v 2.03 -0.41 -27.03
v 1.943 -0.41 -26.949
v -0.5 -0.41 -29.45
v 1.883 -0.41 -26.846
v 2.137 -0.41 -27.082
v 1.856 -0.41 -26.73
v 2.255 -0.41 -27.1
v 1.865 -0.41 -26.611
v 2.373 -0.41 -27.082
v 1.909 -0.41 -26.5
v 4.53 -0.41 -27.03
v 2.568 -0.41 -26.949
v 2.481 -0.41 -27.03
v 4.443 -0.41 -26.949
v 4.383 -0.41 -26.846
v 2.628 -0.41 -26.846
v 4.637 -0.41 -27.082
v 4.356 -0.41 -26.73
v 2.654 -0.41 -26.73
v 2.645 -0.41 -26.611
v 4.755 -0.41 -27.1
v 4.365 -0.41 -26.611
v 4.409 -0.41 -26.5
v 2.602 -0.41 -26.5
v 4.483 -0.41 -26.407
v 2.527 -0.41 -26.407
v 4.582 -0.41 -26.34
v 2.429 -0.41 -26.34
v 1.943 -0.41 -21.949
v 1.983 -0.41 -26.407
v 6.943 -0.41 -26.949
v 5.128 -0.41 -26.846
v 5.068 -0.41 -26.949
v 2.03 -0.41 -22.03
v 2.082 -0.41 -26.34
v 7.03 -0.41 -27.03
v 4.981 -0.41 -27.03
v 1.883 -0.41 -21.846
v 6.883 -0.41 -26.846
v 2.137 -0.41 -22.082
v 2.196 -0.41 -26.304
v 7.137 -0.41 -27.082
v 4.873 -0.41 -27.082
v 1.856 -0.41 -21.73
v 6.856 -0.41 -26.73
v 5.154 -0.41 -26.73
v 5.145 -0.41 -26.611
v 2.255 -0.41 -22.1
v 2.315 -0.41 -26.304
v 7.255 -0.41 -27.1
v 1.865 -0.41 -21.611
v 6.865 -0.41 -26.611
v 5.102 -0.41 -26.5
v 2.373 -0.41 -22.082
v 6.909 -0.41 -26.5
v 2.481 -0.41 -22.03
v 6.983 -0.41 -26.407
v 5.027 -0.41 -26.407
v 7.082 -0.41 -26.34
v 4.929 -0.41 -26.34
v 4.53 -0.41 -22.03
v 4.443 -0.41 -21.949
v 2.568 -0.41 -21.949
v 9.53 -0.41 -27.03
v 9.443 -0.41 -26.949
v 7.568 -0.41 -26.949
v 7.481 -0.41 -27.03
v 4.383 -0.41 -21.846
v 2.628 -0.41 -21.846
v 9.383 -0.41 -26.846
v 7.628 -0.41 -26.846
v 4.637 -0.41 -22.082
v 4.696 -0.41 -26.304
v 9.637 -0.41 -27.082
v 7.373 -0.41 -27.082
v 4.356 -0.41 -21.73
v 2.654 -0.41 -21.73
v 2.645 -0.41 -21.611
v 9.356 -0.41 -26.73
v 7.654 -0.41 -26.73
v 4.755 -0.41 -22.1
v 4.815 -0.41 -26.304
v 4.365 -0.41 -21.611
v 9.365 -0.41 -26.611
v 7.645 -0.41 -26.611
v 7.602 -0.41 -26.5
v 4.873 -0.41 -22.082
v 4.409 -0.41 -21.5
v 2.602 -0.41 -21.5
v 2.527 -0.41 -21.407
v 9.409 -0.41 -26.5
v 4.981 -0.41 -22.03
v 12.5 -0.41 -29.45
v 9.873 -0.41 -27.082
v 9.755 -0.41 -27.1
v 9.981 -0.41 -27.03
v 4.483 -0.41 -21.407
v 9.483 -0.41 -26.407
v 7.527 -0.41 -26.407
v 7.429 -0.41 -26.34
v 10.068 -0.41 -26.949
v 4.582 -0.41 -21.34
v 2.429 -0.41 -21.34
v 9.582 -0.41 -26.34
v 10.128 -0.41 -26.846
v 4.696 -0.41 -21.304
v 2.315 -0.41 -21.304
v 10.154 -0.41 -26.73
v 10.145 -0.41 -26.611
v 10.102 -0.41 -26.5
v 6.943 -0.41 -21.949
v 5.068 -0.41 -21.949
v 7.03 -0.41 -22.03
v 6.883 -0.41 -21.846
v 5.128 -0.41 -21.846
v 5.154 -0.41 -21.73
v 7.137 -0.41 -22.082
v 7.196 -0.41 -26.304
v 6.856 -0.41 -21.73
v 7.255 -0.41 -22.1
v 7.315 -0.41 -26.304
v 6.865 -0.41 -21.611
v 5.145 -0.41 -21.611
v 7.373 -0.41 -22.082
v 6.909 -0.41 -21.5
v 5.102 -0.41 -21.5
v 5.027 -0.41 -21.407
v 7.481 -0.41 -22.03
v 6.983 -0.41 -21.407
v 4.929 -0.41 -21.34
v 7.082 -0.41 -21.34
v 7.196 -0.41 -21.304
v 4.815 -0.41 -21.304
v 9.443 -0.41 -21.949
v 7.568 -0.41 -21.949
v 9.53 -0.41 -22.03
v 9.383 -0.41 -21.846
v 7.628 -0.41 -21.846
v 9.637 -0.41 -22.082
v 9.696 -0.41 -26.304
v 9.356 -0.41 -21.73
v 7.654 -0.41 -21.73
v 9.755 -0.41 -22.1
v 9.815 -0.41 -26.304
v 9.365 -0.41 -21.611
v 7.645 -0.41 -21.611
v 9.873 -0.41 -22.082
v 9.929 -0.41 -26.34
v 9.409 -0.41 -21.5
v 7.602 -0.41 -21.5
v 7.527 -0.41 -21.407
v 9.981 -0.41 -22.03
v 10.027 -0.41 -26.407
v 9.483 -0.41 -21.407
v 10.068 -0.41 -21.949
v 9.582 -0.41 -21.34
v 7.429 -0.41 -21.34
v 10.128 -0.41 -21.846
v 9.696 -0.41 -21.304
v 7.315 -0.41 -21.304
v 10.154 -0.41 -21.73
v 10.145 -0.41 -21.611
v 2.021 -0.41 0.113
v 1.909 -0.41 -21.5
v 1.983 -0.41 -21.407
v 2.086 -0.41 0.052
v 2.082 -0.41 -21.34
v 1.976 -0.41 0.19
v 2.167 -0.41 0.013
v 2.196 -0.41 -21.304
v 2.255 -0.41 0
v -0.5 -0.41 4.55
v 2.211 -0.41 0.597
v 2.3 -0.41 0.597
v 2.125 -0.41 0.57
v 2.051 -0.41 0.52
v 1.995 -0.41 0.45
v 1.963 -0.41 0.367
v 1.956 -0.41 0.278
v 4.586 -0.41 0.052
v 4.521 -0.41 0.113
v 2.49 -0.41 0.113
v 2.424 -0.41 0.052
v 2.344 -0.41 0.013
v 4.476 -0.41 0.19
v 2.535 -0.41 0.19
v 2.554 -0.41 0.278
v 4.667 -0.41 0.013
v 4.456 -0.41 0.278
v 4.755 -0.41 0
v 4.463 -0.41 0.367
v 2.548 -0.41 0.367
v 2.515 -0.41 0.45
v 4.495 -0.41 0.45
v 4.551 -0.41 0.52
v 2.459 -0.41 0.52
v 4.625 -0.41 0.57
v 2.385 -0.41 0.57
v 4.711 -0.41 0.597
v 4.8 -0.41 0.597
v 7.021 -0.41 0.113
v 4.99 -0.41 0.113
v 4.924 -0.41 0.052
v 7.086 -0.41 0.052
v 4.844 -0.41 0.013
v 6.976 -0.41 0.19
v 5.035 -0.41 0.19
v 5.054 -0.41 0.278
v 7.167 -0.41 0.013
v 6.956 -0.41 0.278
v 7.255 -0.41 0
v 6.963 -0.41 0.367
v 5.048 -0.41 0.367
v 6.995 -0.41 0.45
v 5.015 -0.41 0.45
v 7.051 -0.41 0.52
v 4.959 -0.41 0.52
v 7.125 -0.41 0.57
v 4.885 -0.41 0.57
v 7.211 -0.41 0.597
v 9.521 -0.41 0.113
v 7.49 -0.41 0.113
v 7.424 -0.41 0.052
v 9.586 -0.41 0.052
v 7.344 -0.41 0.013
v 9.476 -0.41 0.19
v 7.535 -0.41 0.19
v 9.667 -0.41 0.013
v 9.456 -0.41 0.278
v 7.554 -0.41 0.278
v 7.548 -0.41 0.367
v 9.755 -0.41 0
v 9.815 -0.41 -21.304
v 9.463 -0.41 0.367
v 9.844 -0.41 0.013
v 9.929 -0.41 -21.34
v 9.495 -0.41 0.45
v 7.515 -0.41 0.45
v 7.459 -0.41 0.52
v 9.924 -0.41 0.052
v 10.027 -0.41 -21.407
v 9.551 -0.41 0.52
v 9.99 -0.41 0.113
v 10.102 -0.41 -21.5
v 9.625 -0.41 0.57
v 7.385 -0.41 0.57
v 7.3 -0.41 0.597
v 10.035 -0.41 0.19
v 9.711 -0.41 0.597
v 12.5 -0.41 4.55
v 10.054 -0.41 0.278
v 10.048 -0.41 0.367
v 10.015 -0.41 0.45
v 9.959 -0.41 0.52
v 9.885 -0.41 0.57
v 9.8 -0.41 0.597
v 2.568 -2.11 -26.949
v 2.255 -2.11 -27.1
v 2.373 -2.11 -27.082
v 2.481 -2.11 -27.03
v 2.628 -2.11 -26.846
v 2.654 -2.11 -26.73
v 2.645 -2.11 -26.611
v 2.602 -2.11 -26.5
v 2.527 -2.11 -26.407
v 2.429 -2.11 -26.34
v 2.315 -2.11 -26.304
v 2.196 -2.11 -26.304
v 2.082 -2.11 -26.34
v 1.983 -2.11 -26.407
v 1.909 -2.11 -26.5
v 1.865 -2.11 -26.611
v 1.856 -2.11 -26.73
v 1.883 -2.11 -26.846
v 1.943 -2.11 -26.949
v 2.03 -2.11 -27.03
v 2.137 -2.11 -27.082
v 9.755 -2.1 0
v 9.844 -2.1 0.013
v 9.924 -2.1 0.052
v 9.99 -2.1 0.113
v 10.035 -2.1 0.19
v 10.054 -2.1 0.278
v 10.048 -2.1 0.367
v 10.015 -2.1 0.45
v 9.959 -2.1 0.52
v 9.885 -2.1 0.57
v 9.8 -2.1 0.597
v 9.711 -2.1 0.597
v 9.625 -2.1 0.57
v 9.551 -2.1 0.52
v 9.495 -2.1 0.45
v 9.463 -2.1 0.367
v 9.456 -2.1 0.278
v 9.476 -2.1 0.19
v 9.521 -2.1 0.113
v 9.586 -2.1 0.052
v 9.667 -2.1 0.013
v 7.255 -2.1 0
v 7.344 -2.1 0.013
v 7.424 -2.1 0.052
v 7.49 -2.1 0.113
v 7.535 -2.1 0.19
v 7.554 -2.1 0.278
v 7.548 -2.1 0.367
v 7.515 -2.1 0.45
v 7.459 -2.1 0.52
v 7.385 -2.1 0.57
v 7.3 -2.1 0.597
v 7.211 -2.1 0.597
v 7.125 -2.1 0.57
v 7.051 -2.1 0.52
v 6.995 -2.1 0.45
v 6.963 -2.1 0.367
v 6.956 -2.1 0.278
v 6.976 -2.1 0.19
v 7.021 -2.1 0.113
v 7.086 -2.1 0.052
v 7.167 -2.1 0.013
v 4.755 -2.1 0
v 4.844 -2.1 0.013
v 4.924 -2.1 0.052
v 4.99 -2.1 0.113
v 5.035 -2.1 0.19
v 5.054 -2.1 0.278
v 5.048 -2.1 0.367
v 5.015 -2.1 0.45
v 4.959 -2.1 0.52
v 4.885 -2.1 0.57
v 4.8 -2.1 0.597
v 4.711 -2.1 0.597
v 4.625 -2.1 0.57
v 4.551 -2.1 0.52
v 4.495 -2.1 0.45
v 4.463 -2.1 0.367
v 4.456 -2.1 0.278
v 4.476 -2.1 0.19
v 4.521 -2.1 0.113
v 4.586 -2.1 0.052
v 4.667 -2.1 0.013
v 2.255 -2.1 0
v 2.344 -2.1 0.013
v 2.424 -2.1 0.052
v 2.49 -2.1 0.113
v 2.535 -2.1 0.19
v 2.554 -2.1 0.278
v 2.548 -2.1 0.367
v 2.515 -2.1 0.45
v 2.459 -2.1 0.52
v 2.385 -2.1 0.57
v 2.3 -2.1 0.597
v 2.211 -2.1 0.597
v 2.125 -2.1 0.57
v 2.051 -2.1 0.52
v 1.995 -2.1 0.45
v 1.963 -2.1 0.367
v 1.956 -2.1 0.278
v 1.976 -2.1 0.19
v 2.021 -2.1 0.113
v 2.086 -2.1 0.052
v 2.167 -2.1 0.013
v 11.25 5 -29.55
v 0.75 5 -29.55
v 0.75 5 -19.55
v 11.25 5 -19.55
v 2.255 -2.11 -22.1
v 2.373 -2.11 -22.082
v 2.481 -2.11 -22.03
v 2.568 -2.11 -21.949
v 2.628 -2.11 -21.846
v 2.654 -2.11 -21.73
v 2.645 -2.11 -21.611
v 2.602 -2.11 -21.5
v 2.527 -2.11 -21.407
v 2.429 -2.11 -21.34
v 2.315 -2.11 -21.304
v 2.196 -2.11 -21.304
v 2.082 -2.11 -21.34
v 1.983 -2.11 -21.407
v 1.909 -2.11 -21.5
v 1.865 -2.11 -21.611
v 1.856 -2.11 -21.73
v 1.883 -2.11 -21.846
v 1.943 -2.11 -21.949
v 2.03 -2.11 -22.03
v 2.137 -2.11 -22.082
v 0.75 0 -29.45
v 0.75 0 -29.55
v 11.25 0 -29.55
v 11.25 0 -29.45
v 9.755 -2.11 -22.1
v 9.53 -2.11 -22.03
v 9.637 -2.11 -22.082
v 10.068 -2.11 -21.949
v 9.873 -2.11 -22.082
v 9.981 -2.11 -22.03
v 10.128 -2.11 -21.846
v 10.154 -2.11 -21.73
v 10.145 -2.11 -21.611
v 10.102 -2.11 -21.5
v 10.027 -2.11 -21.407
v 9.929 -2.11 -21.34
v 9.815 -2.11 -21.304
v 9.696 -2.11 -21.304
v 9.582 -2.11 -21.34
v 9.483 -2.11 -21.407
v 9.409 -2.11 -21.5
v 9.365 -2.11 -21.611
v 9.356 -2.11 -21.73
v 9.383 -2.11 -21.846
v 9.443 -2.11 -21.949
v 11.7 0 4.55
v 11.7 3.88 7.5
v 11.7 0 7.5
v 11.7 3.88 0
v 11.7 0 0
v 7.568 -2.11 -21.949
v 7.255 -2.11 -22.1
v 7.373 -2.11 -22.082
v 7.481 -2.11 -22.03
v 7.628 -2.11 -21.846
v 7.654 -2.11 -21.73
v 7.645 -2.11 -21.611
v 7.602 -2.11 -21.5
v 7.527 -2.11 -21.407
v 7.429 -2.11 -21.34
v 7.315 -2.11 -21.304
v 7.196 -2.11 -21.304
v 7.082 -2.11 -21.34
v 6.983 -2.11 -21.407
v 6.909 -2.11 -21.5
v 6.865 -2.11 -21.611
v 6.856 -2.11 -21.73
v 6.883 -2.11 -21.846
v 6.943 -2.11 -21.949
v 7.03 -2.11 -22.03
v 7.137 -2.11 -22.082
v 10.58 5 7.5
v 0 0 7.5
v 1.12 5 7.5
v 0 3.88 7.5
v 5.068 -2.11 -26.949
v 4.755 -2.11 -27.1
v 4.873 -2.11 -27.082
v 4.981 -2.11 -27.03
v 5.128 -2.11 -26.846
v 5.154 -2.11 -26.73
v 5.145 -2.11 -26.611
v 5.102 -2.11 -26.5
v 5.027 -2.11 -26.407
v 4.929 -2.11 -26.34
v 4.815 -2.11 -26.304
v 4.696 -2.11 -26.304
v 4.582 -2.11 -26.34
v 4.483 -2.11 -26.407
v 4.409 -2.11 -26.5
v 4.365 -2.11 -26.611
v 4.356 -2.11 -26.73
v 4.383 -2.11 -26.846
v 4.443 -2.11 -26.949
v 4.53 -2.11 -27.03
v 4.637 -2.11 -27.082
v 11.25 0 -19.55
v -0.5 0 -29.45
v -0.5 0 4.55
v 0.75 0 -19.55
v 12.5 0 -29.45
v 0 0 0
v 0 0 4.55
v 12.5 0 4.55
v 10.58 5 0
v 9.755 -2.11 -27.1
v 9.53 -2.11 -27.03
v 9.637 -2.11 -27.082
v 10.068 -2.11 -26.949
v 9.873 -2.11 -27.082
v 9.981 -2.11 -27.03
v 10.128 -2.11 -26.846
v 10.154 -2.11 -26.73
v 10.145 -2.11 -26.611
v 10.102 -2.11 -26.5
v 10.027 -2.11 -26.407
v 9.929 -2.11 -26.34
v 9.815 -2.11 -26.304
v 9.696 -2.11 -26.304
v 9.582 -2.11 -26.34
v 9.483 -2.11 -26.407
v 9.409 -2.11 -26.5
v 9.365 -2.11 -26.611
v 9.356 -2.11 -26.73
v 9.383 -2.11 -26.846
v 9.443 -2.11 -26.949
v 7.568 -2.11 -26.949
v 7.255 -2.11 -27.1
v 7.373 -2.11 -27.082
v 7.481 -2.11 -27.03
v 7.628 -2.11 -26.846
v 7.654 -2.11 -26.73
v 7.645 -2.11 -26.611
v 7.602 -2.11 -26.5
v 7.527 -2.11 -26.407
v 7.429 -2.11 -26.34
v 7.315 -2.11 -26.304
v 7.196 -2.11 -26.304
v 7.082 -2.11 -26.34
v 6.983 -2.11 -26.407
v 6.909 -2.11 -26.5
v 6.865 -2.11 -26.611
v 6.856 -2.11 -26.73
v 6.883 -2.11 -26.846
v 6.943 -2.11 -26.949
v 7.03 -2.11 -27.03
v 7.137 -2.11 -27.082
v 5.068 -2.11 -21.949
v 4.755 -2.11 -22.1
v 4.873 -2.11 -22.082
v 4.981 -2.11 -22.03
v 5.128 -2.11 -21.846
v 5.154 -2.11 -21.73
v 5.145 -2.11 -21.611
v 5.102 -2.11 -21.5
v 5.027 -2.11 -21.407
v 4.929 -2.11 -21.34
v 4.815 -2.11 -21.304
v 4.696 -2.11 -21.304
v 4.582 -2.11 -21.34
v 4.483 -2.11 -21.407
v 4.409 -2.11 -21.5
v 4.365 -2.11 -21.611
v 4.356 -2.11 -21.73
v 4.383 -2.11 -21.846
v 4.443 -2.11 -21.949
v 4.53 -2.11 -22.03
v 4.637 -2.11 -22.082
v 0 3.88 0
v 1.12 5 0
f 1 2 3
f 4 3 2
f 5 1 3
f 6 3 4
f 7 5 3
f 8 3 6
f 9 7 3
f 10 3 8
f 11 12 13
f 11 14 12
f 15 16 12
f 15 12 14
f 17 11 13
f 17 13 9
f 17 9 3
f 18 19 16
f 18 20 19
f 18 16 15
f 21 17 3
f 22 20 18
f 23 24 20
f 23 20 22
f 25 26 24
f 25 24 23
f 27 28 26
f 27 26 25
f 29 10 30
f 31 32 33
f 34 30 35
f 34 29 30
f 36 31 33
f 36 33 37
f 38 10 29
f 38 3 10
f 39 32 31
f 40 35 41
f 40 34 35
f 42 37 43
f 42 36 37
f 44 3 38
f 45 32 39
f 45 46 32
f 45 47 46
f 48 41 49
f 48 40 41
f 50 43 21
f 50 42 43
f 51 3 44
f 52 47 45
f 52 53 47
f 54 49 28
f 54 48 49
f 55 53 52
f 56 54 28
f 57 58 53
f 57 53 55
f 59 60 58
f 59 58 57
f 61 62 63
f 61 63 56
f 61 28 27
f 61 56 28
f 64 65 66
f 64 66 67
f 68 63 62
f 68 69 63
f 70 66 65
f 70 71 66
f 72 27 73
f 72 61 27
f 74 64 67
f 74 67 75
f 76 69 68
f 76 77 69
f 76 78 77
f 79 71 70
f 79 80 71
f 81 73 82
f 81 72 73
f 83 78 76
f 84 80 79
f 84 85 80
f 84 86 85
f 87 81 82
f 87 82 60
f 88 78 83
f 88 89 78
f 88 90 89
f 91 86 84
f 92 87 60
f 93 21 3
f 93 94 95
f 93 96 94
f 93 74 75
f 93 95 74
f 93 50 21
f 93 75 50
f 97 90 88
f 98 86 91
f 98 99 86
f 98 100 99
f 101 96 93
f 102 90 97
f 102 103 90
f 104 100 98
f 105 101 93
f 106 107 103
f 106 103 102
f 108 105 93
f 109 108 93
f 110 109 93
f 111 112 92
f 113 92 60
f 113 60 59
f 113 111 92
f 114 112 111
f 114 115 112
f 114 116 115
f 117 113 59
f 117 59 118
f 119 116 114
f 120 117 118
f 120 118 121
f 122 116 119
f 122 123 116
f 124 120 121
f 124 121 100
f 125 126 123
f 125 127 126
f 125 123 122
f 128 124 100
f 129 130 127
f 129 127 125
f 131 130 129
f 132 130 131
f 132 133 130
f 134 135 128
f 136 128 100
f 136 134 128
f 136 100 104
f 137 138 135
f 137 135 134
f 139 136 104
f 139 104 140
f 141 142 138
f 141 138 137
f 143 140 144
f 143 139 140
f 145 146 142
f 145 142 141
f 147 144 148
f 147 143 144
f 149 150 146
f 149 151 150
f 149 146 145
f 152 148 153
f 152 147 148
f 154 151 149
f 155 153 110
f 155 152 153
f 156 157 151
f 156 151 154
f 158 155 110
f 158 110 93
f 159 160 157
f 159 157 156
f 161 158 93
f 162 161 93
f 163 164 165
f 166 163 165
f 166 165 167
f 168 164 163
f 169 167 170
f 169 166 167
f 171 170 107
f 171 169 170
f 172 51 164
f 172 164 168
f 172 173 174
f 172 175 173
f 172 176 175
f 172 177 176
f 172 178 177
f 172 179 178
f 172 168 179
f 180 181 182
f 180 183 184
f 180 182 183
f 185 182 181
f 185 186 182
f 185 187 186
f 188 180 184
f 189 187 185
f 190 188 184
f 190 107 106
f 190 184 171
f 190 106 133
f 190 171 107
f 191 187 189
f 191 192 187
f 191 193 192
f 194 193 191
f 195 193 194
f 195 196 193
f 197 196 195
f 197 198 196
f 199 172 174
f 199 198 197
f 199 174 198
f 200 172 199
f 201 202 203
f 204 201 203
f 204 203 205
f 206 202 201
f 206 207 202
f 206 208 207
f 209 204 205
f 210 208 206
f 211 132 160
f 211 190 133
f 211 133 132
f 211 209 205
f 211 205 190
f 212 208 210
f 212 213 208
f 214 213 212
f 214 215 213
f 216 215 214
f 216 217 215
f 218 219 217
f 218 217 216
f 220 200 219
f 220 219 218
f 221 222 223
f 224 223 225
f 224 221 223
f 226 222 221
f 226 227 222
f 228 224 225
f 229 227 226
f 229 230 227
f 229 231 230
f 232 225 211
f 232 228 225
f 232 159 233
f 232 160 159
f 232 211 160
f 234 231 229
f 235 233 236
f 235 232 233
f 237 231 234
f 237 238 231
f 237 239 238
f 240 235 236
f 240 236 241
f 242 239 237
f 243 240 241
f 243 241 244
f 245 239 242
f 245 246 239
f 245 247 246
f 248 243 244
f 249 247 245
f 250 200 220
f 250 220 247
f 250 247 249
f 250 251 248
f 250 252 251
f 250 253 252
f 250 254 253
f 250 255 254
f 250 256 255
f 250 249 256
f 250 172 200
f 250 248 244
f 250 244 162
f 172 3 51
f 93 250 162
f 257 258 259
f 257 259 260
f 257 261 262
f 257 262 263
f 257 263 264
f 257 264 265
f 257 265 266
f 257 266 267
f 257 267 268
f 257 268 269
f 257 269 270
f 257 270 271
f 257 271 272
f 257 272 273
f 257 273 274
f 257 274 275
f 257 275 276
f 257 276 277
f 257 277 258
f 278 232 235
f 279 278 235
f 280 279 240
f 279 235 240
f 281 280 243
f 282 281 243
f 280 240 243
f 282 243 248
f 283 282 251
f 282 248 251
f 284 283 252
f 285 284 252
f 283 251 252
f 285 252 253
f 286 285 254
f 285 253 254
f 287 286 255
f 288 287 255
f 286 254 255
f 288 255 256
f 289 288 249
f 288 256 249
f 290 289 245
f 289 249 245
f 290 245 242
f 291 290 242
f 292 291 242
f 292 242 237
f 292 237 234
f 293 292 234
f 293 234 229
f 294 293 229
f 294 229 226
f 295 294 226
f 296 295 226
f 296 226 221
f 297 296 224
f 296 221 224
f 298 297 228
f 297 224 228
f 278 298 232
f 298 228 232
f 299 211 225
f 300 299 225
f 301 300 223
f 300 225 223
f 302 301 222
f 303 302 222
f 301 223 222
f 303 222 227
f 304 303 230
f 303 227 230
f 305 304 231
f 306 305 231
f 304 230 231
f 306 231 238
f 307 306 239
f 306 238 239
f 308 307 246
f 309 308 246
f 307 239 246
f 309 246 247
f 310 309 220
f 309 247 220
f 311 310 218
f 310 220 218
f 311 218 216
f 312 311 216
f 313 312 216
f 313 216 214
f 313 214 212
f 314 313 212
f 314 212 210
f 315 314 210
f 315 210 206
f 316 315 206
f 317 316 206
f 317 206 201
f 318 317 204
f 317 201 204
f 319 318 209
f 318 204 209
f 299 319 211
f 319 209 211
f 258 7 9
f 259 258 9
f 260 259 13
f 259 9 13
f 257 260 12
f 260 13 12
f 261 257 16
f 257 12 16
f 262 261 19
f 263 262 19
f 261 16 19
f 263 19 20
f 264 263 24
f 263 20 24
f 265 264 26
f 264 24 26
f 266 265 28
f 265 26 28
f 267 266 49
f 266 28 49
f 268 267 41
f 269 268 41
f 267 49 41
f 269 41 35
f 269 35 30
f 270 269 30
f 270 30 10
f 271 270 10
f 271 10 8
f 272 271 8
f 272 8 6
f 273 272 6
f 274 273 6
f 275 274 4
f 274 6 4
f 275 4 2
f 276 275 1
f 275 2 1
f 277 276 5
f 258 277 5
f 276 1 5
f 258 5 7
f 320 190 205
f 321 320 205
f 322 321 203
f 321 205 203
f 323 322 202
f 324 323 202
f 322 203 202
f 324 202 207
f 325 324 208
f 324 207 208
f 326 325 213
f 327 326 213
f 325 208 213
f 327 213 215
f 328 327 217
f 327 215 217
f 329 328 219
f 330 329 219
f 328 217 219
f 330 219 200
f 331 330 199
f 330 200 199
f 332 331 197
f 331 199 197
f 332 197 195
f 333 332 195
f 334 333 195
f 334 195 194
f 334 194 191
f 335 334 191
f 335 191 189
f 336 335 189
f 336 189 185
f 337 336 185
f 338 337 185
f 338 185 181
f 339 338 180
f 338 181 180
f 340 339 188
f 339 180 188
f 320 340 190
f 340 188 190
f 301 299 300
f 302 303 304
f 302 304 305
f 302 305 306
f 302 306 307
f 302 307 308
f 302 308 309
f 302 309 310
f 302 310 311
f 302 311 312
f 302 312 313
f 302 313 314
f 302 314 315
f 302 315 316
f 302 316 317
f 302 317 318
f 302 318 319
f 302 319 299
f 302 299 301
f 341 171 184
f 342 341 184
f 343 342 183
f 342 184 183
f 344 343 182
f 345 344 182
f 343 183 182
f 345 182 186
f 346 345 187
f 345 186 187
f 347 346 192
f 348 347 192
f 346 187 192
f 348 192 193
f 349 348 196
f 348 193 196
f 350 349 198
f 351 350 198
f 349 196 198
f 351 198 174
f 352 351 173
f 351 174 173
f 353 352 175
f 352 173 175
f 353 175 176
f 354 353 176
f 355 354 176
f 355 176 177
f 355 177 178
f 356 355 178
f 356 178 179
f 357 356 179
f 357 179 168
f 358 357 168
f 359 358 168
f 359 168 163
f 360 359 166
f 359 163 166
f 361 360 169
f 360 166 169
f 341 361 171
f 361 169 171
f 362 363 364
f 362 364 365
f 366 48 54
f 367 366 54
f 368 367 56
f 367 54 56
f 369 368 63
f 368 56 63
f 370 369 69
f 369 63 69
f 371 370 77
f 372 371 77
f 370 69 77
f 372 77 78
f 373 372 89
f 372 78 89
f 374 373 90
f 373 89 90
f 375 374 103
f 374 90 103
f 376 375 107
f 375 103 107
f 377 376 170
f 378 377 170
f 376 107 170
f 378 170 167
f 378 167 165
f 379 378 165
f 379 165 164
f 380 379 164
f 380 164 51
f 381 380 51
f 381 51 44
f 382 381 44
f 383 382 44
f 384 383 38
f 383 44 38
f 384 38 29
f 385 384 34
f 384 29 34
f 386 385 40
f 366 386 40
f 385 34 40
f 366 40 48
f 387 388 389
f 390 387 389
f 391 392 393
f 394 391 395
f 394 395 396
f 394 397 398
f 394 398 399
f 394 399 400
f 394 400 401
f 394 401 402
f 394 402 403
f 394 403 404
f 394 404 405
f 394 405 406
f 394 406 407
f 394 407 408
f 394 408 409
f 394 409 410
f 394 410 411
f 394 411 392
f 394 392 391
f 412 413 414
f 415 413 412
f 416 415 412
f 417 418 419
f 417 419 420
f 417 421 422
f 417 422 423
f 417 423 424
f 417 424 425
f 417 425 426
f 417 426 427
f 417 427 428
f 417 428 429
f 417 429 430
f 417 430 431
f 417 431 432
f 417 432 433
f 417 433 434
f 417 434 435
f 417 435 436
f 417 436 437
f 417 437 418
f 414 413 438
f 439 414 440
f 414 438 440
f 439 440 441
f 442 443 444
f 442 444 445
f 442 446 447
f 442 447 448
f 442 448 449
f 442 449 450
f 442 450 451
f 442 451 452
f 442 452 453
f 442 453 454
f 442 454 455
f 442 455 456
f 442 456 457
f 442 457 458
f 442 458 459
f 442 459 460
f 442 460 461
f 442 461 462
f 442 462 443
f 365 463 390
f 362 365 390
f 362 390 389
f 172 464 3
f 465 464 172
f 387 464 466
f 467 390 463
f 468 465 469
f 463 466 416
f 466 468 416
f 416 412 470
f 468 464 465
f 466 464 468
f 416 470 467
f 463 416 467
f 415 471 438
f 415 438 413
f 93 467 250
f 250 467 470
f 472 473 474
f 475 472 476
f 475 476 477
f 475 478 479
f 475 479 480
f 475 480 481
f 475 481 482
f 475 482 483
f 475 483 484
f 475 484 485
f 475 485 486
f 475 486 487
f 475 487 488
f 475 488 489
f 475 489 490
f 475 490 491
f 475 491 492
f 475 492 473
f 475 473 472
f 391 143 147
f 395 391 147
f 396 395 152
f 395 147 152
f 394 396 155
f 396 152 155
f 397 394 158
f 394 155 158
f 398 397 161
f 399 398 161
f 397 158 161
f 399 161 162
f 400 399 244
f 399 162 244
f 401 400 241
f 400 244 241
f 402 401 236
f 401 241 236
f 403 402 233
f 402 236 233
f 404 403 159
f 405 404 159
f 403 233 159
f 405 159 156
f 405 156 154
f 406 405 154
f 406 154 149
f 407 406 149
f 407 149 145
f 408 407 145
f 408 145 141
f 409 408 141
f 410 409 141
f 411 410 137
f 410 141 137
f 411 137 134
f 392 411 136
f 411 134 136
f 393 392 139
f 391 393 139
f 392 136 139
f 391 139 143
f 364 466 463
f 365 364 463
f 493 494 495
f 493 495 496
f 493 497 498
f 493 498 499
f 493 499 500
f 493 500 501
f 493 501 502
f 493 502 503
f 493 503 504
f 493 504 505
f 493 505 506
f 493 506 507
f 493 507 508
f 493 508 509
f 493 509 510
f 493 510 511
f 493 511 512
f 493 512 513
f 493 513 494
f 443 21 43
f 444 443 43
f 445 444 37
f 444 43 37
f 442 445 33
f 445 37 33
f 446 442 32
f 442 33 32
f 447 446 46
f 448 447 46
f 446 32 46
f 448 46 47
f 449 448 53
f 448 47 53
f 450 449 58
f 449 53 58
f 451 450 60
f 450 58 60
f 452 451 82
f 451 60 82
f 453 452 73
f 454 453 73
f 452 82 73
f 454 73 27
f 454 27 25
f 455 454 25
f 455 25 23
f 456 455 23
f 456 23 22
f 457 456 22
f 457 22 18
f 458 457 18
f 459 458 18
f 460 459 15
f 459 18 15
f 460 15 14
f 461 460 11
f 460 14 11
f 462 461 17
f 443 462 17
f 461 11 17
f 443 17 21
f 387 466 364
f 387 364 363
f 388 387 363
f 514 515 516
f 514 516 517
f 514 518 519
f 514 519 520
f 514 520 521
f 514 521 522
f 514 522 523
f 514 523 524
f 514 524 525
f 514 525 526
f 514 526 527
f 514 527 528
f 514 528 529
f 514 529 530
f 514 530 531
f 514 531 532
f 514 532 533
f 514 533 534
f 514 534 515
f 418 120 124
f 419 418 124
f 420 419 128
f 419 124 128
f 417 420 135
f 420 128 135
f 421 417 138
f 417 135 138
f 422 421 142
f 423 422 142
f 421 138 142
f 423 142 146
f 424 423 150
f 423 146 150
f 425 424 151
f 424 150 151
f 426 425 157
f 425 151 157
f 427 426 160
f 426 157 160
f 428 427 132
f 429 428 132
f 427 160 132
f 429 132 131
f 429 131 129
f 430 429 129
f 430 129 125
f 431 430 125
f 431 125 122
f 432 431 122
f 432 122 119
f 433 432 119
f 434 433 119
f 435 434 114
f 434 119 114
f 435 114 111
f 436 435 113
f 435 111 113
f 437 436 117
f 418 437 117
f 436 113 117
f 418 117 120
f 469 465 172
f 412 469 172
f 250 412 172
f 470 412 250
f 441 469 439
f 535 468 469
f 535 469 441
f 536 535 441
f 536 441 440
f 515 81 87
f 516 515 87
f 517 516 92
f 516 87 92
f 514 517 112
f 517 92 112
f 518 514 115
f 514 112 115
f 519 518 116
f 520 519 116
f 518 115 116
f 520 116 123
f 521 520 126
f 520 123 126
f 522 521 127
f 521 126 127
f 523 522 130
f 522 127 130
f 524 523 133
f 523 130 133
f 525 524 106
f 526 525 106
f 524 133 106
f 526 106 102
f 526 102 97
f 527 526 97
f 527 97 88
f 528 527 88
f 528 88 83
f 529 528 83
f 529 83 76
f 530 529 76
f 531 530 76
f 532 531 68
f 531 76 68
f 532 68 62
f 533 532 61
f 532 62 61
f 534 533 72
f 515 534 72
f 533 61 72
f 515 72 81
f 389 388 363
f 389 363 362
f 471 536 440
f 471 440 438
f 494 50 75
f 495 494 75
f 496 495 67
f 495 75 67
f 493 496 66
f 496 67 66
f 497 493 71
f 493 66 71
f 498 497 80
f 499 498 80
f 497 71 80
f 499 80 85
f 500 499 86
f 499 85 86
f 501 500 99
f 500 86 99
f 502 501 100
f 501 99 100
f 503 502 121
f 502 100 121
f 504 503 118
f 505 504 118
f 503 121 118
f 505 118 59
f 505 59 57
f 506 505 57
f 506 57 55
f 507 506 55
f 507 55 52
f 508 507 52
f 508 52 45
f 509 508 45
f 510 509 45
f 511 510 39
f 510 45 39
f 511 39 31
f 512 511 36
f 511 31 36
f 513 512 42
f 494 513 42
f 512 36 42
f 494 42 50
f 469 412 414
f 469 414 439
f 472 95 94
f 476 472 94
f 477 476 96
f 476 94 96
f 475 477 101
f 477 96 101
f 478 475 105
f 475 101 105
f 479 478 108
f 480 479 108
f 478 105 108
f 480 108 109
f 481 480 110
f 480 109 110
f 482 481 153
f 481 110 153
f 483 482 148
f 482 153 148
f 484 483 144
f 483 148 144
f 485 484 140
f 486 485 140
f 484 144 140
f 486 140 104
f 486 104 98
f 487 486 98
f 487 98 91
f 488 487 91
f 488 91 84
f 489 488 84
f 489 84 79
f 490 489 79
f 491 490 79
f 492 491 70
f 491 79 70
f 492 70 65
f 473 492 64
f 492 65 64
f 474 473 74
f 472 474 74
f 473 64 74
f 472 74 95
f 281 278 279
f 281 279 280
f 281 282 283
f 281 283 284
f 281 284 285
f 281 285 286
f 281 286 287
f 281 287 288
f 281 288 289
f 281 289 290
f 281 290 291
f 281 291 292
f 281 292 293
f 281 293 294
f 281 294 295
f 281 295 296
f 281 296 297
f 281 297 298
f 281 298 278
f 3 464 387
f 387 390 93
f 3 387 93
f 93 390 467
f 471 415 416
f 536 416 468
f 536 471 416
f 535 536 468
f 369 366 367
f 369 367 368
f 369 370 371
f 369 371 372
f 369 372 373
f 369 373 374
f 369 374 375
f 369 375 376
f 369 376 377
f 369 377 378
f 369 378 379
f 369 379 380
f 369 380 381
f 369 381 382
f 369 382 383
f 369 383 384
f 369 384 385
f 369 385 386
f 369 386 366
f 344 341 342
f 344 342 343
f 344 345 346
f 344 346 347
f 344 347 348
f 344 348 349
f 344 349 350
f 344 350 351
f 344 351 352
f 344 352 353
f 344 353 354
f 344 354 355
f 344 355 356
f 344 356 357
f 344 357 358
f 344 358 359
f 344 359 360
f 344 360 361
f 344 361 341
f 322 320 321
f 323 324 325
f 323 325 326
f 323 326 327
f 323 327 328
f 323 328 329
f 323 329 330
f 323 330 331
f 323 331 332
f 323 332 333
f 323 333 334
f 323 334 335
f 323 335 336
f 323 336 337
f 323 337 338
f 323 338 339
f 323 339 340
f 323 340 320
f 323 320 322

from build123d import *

# Parameters (mm, degrees)
DODANIE_WYCI_GNI_CIE1_DEPTH = 7.5
SZKIC2_W                    = 13
SZKIC2_H                    = 34
DODANIE_WYCI_GNI_CIE2_DEPTH = 0.41
SZKIC3_R                    = 0.3
DODANIE_WYCI_GNI_CIE3_DEPTH = 1.69
SZKIC4_W                    = 10.5
SZKIC4_H                    = 10
DODANIE_WYCI_GNI_CIE4_DEPTH = 5
SZKIC6_R                    = 0.4
DODANIE_WYCI_GNI_CIE5_DEPTH = 1.7


with BuildPart() as part:
    # Szkic1 → Dodanie-wyciągnięcie1 (new body)
    with BuildSketch(Plane.XY):
        Polygon((10.58, 5), (11.7, 3.88), (11.7, 0), (0, 0), (0, 3.88), (1.12, 5), align=None)
    extrude(amount=DODANIE_WYCI_GNI_CIE1_DEPTH)

    # Szkic2 → Dodanie-wyciągnięcie2 (add)
    with BuildSketch(Plane.XZ):
        with Locations((6, -12.45)):
            Rectangle(SZKIC2_W, SZKIC2_H)
    extrude(amount=DODANIE_WYCI_GNI_CIE2_DEPTH)

    # Szkic3 → Dodanie-wyciągnięcie3 (add)
    with BuildSketch(Plane.XZ.offset(0.41)):
        with Locations(Location((2.255290514, 0.3, 0), (0, 0, 270))):
            Circle(SZKIC3_R)
        with Locations(Location((4.755290514, 0.3, 0), (0, 0, 270))):
            Circle(SZKIC3_R)
        with Locations(Location((7.255290514, 0.3, 0), (0, 0, 270))):
            Circle(SZKIC3_R)
        with Locations(Location((9.755290514, 0.3, 0), (0, 0, 270))):
            Circle(SZKIC3_R)
    extrude(amount=DODANIE_WYCI_GNI_CIE3_DEPTH)

    # Szkic4 → Dodanie-wyciągnięcie4 (add)
    with BuildSketch(Plane(origin=(0, 0, 0), x_dir=(1, 0, 0), z_dir=(0, 1, 0))):
        with Locations((6, 24.55)):
            Rectangle(SZKIC4_W, SZKIC4_H)
    extrude(amount=DODANIE_WYCI_GNI_CIE4_DEPTH)

    # Szkic6 → Dodanie-wyciągnięcie5 (add)
    with BuildSketch(Plane.XZ.offset(0.41)):
        with Locations(Location((2.255290514, -26.7, 0), (0, 0, 270))):
            Circle(SZKIC6_R)
        with Locations(Location((4.755290514, -26.7, 0), (0, 0, 270))):
            Circle(SZKIC6_R)
        with Locations(Location((7.255290514, -26.7, 0), (0, 0, 270))):
            Circle(SZKIC6_R)
        with Locations(Location((9.755290514, -26.7, 0), (0, 0, 270))):
            Circle(SZKIC6_R)
        with Locations(Location((4.755290514, -21.7, 0), (0, 0, 270))):
            Circle(SZKIC6_R)
        with Locations(Location((7.255290514, -21.7, 0), (0, 0, 270))):
            Circle(SZKIC6_R)
        with Locations(Location((9.755290514, -21.7, 0), (0, 0, 270))):
            Circle(SZKIC6_R)
        with Locations(Location((2.255290514, -21.7, 0), (0, 0, 270))):
            Circle(SZKIC6_R)
    extrude(amount=DODANIE_WYCI_GNI_CIE5_DEPTH)


solid = part.part
